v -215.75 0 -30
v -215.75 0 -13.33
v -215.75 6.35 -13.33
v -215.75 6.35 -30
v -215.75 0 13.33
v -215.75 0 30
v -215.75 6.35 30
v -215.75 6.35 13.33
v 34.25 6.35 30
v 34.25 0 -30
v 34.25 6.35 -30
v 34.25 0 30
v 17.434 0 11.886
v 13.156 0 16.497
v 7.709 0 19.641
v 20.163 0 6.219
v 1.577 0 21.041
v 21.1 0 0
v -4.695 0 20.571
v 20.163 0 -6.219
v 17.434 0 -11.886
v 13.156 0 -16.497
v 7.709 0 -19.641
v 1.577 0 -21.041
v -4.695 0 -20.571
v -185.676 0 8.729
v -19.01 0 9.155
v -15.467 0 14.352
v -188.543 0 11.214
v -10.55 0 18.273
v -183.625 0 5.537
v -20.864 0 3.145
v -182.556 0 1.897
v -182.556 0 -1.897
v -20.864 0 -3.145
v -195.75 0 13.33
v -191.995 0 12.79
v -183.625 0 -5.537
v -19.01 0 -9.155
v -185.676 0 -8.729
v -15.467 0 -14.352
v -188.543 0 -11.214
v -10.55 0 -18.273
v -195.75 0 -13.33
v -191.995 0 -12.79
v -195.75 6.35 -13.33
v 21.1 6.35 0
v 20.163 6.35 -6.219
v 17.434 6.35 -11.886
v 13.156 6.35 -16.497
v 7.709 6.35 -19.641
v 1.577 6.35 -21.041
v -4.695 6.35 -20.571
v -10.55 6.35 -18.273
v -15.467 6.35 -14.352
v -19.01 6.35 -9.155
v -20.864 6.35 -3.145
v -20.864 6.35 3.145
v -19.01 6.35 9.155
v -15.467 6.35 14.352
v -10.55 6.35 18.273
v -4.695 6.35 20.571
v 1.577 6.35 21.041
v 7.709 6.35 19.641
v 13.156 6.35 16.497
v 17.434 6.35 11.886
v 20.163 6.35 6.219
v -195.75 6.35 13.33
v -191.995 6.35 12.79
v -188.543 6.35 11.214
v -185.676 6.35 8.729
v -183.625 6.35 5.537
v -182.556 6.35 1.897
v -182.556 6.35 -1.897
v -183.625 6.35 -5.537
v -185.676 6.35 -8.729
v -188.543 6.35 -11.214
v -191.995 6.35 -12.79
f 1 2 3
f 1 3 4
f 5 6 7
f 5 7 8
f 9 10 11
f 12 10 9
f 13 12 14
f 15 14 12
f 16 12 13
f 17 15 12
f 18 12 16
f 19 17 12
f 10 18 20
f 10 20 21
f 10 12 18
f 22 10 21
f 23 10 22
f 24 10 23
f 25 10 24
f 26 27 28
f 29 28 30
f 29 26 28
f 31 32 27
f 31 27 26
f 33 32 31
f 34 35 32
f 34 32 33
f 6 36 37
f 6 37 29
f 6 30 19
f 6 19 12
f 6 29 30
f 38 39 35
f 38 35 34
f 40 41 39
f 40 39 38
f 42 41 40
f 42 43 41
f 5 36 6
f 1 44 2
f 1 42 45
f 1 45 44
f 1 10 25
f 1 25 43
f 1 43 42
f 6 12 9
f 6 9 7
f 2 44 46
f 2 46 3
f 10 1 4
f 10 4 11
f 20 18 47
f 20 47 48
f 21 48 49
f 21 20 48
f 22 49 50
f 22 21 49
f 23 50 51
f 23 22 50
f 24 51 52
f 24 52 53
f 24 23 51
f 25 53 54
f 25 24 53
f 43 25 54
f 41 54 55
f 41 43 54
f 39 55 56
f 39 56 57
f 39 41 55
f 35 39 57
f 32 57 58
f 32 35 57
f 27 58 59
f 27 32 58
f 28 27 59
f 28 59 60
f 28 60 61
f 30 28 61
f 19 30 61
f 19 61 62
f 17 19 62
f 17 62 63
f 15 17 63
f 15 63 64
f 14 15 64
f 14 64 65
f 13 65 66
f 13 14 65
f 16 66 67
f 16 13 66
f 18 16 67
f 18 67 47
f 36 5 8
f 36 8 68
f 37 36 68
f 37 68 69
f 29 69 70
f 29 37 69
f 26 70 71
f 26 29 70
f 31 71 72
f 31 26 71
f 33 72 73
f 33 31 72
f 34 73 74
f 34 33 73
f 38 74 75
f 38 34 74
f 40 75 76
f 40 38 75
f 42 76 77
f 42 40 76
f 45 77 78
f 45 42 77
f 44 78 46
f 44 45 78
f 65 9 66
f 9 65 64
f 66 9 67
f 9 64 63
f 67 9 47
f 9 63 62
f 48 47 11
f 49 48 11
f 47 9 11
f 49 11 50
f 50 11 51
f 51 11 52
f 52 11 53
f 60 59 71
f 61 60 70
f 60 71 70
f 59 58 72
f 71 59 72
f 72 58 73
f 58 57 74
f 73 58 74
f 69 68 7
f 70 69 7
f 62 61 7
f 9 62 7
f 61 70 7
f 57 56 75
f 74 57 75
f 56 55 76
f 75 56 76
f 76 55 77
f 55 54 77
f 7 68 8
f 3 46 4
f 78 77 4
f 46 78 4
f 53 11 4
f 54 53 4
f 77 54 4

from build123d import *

# Parameters (mm, degrees)
SKETCH1_R           = 21.1
BOSS_EXTRUDE1_DEPTH = 6.35


with BuildPart() as part:
    # Sketch1 → Boss-Extrude1 (new body)
    with BuildSketch(Plane(origin=(0, 0, 0), x_dir=(1, 0, 0), z_dir=(0, 1, 0))):
        with BuildLine():
            Line((-195.75, 13.33), (-215.75, 13.33))
            Line((-215.75, 13.33), (-215.75, 30))
            Line((-215.75, 30), (34.25, 30))
            Line((34.25, 30), (34.25, -30))
            Line((34.25, -30), (-215.75, -30))
            Line((-215.75, -30), (-215.75, -13.33))
            Line((-215.75, -13.33), (-195.75, -13.33))
            ThreePointArc((-195.75, -13.33), (-182.42, 0), (-195.75, 13.33))
        make_face()
        Circle(SKETCH1_R, mode=Mode.SUBTRACT)
    extrude(amount=BOSS_EXTRUDE1_DEPTH)


solid = part.part
